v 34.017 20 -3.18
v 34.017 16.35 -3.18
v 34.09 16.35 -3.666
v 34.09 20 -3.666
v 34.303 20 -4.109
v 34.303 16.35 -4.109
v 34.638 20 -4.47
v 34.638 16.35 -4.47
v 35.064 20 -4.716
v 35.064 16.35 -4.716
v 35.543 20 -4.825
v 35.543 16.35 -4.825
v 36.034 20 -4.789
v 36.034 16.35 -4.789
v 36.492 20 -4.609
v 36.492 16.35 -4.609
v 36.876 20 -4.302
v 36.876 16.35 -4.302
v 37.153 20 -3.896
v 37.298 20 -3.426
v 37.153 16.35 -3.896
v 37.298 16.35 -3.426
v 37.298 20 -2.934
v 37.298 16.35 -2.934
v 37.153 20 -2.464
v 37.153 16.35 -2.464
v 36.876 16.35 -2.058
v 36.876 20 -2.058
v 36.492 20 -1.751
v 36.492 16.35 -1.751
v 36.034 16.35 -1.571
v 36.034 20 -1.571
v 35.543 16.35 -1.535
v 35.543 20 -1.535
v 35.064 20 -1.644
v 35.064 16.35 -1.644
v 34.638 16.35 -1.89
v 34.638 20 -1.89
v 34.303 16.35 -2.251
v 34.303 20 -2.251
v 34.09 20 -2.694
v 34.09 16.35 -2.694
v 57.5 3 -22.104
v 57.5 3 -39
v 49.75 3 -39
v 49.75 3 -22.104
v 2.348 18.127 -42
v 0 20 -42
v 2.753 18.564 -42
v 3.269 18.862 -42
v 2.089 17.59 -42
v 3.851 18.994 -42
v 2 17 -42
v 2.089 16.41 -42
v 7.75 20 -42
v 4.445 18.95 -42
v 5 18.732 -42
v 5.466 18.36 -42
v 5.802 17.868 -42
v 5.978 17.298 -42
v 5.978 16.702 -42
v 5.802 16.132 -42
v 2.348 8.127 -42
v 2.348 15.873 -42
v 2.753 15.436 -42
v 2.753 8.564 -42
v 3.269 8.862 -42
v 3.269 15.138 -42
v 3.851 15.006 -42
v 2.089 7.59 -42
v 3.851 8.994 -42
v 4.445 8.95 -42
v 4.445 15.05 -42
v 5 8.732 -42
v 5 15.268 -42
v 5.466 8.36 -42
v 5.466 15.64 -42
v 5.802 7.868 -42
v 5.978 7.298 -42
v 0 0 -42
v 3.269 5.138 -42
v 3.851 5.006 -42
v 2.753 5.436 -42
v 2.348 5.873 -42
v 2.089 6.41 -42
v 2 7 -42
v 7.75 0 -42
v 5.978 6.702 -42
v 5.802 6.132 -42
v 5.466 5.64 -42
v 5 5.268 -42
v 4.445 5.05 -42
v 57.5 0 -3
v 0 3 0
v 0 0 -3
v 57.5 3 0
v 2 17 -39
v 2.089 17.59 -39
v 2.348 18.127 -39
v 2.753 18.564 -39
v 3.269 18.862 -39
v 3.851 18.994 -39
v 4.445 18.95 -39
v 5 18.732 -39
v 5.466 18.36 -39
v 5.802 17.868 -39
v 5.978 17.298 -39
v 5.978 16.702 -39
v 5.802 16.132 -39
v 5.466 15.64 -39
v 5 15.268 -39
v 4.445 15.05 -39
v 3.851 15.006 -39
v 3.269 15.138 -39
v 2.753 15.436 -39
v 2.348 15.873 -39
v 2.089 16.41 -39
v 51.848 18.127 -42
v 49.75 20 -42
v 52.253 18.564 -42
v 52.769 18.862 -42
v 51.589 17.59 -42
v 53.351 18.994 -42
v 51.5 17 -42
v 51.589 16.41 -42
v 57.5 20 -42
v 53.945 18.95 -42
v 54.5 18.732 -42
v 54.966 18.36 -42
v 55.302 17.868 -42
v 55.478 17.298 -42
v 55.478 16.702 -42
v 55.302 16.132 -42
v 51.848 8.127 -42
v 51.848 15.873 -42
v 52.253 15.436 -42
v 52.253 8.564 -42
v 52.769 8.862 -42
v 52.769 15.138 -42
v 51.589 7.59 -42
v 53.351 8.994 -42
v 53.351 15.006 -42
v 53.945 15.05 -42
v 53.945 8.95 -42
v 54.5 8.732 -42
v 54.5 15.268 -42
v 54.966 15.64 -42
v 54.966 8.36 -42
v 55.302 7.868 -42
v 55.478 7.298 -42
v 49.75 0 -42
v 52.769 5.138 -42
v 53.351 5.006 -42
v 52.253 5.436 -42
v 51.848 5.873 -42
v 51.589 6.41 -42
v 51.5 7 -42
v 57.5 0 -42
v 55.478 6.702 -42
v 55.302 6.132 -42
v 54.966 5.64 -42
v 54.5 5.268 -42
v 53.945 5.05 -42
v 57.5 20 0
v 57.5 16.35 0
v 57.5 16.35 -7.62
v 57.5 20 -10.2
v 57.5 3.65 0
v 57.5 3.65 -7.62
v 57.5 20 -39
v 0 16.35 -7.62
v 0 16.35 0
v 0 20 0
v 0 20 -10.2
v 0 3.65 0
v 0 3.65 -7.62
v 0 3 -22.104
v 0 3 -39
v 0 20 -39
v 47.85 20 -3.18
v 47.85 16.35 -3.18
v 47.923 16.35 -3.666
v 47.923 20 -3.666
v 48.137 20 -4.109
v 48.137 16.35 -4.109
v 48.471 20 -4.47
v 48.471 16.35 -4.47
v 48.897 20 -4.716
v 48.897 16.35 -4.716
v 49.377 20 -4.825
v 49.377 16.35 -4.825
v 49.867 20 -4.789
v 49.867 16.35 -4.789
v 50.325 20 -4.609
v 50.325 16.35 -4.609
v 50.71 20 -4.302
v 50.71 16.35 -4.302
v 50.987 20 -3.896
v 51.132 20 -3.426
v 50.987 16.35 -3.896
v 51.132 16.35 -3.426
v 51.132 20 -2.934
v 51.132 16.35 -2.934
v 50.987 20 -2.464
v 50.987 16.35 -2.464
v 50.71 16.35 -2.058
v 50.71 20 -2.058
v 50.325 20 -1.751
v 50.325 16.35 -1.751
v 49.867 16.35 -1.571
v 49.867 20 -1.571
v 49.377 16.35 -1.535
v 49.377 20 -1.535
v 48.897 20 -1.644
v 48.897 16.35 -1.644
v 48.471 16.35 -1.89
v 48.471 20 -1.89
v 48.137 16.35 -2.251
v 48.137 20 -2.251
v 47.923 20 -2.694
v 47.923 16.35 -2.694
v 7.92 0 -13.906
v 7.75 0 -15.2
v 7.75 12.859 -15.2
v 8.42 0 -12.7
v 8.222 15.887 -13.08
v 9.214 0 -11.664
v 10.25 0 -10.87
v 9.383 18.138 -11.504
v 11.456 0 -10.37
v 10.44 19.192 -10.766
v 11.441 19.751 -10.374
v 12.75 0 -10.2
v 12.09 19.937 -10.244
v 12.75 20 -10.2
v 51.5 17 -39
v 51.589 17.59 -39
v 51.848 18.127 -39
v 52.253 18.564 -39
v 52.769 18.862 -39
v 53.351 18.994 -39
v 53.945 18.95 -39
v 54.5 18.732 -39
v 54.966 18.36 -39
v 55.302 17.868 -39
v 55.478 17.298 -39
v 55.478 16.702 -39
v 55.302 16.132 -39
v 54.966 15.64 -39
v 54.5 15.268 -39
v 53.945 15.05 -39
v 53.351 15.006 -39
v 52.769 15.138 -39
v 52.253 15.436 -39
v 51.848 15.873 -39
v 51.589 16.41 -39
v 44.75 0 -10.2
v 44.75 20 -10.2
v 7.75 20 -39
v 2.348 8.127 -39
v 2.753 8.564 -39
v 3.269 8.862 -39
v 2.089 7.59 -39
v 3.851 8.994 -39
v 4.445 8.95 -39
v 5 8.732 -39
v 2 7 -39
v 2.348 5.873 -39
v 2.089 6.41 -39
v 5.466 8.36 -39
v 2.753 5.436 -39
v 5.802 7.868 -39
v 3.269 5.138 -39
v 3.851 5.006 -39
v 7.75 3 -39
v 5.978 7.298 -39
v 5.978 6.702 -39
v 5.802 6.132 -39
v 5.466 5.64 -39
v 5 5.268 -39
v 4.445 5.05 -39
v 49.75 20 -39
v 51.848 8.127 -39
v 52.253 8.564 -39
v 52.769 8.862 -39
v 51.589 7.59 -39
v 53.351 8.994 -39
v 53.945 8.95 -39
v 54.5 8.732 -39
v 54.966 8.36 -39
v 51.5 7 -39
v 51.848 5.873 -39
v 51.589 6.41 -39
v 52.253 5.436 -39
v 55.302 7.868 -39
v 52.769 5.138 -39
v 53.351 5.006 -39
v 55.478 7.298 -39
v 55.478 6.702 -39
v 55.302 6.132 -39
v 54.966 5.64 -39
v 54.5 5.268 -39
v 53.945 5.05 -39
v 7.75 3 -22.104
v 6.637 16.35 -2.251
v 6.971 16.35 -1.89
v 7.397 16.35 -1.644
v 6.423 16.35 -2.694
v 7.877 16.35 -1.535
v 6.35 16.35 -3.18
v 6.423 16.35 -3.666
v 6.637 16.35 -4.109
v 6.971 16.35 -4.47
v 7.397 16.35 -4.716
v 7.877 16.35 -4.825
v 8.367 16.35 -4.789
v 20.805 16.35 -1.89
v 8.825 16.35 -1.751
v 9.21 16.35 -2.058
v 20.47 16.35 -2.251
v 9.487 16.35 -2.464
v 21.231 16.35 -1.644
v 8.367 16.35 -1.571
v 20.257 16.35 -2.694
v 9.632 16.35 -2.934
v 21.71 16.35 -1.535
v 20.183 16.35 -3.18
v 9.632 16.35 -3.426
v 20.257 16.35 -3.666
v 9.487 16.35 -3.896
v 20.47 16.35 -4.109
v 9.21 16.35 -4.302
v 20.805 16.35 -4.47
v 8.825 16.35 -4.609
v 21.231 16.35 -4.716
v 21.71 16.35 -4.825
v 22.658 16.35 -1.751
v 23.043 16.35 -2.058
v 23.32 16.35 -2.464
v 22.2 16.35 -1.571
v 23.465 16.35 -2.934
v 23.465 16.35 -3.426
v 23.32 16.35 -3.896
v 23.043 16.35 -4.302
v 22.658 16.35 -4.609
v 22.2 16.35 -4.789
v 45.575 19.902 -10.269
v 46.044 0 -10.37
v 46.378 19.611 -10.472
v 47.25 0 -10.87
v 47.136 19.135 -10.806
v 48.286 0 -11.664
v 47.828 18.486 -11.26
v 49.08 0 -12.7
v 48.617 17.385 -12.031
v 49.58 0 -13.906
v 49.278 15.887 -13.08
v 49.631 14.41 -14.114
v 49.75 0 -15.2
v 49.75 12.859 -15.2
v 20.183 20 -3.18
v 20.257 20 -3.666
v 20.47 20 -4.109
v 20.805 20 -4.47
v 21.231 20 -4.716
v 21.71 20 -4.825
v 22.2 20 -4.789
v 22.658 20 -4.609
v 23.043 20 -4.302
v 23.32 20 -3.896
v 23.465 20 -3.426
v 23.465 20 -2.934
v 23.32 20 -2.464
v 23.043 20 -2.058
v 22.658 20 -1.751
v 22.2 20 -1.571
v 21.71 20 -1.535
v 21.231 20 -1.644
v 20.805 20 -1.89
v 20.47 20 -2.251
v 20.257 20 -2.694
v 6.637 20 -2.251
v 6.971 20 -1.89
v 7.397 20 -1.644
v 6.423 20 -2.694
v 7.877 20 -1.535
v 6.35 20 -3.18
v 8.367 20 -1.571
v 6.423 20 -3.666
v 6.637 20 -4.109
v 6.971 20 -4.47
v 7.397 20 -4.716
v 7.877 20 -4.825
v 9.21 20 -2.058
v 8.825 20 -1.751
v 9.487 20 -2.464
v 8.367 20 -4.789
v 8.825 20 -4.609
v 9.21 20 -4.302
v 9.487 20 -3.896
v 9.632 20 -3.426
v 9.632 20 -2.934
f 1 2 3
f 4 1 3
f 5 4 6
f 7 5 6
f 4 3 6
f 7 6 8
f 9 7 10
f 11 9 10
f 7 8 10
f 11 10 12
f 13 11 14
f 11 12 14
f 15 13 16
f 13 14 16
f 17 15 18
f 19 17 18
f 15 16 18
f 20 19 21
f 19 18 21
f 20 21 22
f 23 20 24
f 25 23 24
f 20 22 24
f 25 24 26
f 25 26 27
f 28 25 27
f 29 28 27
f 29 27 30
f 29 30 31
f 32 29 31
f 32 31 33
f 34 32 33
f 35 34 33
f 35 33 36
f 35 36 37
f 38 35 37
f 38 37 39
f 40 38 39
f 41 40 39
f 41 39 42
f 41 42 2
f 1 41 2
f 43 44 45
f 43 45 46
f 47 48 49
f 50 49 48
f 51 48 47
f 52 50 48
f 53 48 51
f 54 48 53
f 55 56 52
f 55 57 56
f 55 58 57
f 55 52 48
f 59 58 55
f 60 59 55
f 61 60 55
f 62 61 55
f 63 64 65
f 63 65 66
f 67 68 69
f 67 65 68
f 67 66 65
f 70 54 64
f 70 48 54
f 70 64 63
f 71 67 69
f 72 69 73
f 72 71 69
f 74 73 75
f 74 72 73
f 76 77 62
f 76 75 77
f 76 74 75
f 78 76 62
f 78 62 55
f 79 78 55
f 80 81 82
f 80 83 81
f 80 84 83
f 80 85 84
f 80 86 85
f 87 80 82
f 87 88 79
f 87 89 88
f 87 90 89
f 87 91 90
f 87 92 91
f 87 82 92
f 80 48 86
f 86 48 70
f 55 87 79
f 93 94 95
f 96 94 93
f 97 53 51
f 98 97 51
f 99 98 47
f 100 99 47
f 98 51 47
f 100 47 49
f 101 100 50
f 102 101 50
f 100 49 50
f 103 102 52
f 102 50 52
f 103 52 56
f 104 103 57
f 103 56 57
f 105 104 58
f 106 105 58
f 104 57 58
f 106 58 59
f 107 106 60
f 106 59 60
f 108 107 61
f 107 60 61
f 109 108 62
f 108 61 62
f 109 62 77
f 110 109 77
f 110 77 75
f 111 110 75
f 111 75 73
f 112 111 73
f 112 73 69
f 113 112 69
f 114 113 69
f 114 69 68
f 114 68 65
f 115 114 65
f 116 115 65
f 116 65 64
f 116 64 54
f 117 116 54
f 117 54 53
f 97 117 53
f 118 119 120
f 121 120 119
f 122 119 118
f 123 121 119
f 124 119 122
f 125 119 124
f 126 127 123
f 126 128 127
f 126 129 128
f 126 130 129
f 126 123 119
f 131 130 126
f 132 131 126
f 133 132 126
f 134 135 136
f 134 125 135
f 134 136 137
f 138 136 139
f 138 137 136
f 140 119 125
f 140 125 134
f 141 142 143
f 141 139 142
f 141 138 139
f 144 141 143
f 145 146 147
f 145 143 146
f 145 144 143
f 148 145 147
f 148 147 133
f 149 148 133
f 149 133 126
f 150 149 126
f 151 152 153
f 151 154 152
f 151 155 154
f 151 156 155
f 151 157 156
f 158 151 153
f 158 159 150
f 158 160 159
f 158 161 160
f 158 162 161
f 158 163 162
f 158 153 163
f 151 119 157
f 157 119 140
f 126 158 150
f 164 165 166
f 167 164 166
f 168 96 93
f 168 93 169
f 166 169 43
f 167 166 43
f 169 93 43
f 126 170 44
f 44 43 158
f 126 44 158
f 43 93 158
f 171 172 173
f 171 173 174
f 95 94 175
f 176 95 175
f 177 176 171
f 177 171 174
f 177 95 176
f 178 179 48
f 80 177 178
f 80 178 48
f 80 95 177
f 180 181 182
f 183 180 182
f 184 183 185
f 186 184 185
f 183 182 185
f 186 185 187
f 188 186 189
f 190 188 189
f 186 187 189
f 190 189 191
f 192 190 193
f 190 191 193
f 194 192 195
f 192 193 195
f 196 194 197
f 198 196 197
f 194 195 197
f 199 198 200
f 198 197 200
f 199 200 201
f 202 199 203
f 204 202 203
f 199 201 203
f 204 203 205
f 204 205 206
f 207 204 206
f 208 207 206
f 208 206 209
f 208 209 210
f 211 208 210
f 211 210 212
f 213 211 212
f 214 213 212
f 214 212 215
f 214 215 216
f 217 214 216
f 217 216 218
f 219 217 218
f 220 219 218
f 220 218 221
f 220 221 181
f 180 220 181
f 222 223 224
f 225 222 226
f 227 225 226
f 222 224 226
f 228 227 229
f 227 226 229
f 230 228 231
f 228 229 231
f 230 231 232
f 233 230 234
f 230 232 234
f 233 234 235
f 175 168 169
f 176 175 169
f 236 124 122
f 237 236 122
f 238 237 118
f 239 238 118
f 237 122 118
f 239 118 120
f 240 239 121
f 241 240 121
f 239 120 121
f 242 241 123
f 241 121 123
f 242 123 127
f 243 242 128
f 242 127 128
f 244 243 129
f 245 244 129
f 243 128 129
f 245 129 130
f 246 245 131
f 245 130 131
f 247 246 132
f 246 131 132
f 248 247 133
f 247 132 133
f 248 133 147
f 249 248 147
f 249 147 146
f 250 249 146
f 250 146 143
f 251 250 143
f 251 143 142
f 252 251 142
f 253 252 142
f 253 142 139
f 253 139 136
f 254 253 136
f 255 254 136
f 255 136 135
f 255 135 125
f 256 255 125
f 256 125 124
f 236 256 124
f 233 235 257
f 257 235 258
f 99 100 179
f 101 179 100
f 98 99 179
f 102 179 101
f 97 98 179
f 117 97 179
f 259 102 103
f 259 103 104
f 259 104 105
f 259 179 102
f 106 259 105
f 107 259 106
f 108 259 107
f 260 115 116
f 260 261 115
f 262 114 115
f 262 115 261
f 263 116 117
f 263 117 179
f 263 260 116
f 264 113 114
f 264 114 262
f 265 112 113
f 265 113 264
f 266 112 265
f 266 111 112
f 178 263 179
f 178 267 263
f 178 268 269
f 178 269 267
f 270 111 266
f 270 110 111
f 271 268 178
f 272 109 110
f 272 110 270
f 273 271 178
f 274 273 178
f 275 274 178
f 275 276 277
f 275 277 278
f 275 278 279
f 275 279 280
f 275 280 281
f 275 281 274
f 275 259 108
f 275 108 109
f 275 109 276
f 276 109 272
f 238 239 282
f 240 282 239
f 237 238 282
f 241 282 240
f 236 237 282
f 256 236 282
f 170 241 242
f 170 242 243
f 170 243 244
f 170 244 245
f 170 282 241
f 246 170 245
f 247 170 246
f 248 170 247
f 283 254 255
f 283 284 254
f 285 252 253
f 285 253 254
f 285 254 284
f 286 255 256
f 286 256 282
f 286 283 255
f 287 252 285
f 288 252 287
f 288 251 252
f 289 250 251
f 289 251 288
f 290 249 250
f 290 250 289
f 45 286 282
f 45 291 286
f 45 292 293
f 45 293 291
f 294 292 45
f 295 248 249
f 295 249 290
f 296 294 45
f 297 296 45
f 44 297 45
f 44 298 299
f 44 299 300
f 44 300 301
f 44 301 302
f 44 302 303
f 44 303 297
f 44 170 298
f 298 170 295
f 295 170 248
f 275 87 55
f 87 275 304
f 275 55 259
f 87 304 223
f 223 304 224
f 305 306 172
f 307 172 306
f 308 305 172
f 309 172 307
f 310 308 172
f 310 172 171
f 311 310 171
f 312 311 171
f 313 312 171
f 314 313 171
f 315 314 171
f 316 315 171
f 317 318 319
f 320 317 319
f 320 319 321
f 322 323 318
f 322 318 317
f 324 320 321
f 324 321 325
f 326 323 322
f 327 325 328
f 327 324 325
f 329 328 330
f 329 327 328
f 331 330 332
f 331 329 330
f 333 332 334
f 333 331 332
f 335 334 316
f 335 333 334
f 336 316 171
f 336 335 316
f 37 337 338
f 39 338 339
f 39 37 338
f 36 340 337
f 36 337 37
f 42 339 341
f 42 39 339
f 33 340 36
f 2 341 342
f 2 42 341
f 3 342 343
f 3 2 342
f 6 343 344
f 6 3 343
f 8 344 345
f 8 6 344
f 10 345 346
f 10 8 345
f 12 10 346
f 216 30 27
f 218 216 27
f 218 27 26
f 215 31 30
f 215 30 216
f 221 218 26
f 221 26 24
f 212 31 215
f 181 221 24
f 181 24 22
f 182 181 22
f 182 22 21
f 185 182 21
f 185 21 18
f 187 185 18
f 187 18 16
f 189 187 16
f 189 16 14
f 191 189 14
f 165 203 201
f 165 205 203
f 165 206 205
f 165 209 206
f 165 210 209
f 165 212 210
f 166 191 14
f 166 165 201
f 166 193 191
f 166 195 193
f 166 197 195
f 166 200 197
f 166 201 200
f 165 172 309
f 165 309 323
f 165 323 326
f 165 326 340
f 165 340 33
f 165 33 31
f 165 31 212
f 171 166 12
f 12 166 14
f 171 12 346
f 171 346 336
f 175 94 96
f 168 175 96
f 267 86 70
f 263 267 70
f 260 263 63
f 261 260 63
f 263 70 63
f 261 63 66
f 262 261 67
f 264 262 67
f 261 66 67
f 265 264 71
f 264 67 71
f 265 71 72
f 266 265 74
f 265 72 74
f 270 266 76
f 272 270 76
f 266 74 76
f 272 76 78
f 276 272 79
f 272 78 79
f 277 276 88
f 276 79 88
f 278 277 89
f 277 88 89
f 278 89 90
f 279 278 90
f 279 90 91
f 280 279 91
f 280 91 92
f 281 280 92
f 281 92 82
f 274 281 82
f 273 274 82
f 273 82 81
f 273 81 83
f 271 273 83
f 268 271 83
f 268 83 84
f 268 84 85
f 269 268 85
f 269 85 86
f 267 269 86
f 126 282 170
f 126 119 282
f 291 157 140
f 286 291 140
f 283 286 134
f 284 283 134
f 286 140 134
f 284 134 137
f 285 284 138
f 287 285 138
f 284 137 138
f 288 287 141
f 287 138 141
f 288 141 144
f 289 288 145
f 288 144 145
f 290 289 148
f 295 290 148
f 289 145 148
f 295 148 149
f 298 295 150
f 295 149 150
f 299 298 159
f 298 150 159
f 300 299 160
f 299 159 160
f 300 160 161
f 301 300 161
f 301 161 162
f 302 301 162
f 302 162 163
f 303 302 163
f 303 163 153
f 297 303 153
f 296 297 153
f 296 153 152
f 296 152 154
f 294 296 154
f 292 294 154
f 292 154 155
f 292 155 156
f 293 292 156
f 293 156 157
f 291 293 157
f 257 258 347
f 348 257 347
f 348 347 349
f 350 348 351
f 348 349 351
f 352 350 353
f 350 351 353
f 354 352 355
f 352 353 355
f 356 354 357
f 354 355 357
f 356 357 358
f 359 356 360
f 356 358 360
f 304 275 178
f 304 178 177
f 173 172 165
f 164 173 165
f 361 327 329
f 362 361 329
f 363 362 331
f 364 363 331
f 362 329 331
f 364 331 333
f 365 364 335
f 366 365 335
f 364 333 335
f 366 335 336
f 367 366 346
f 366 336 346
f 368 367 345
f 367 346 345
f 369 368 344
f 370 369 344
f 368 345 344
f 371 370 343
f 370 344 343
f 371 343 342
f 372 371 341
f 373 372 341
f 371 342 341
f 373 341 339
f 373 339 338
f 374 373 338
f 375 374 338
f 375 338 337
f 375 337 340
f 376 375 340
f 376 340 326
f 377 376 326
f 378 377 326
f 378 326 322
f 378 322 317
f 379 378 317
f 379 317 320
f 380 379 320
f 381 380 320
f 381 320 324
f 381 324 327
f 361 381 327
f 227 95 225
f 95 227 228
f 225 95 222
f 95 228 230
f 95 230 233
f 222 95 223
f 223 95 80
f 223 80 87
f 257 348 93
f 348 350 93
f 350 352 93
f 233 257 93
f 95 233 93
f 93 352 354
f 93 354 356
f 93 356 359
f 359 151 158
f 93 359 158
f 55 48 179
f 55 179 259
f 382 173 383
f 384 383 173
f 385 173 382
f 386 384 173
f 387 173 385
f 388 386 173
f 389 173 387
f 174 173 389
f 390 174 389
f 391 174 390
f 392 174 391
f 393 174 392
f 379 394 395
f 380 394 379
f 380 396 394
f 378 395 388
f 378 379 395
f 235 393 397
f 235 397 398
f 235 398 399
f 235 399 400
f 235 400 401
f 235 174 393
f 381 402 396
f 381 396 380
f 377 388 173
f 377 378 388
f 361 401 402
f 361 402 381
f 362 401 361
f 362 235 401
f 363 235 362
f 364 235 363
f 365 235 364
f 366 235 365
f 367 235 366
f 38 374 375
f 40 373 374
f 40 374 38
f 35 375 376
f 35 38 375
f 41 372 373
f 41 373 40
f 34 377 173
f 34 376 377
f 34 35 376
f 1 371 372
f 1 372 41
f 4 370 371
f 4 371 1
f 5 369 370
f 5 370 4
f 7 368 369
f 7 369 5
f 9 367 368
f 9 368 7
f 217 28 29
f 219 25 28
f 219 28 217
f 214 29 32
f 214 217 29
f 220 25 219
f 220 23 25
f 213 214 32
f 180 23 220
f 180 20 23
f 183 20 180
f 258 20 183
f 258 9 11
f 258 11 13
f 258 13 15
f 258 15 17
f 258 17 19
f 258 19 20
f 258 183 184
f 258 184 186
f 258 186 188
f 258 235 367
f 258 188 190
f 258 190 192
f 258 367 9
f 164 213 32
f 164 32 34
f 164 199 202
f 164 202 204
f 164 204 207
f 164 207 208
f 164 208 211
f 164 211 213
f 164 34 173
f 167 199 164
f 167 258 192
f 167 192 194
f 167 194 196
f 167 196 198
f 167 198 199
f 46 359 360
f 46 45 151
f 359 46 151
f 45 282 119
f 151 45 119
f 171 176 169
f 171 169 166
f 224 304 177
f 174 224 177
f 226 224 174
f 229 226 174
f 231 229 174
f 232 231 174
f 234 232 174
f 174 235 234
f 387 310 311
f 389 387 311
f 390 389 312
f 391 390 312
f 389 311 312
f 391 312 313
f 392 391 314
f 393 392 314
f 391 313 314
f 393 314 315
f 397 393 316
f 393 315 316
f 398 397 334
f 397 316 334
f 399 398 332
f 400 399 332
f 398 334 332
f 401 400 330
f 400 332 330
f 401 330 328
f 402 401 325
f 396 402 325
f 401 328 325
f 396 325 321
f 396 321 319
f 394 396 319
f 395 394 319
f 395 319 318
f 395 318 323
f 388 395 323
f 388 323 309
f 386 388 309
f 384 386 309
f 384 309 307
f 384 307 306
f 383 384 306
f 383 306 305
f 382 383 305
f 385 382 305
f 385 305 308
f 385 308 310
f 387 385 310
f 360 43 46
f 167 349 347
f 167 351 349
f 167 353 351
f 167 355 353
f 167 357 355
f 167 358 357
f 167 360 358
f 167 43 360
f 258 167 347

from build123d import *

# Parameters (mm, degrees)
SKETCH1_W                 = 57.5
SKETCH1_H                 = 42
BOSS_EXTRUDE1_DEPTH       = 20
CUT_EXTRUDE1_DEPTH        = 21
CUT_EXTRUDE2_DEPTH        = 58.5
CUT_EXTRUDE3_REACH        = 44
SKETCH4_R                 = 2
SKETCH5_W                 = 7.62
SKETCH5_H                 = 12.7
CUT_EXTRUDE4_DEPTH        = 58.5
M4X0_7_TAPPED_HOLE1_D     = 3.3
M4X0_7_TAPPED_HOLE1_DEPTH = 3.65
CHAMFER1_SIZE             = 3


with BuildPart() as part:
    # Sketch1 → Boss-Extrude1 (new body)
    with BuildSketch(Plane(origin=(0, 0, 0), x_dir=(1, 0, 0), z_dir=(0, 1, 0))):
        with Locations((28.75, 21)):
            Rectangle(SKETCH1_W, SKETCH1_H)
    extrude(amount=BOSS_EXTRUDE1_DEPTH)

    # Sketch2 → Cut-Extrude1 (cut, through all)
    with BuildSketch(Plane(origin=(0, 20, 0), x_dir=(1, 0, 0), z_dir=(0, 1, 0))):
        with BuildLine():
            Line((7.75, 42), (7.75, 15.2))
            ThreePointArc((7.75, 15.2), (9.214466094, 11.664466094), (12.75, 10.2))
            Line((12.75, 10.2), (44.75, 10.2))
            ThreePointArc((44.75, 10.2), (48.285533906, 11.664466094), (49.75, 15.2))
            Line((49.75, 15.2), (49.75, 42))
            Line((49.75, 42), (7.75, 42))
        make_face()
    extrude(amount=-CUT_EXTRUDE1_DEPTH, mode=Mode.SUBTRACT)

    # Sketch3 → Cut-Extrude2 (cut, through all)
    with BuildSketch(Plane(origin=(57.5, 0, 0), x_dir=(0, 0, -1), z_dir=(1, 0, 0))):
        Polygon((39, 20), (39, 3), (22.10352815, 3), (10.2, 20), align=None)
    extrude(amount=-CUT_EXTRUDE2_DEPTH, mode=Mode.SUBTRACT)

    # Sketch4 → Cut-Extrude3 (cut, up to next)
    with BuildSketch(Plane(origin=(0, 0, -42), x_dir=(-1, 0, 0), z_dir=(0, 0, -1)), mode=Mode.PRIVATE) as cut_extrude3_sk1:
        with Locations((-53.5, 17)):
            Circle(SKETCH4_R)
    cut_extrude3_tool1 = extrude(cut_extrude3_sk1.sketch, amount=-CUT_EXTRUDE3_REACH, mode=Mode.PRIVATE) & part.part
    add(cut_extrude3_tool1.solids().sort_by_distance((53.5, 17, -42))[0], mode=Mode.SUBTRACT)
    # Sketch4 → Cut-Extrude3 (cut, up to next)
    with BuildSketch(Plane(origin=(0, 0, -42), x_dir=(-1, 0, 0), z_dir=(0, 0, -1)), mode=Mode.PRIVATE) as cut_extrude3_sk2:
        with Locations((-4, 17)):
            Circle(SKETCH4_R)
    cut_extrude3_tool2 = extrude(cut_extrude3_sk2.sketch, amount=-CUT_EXTRUDE3_REACH, mode=Mode.PRIVATE) & part.part
    add(cut_extrude3_tool2.solids().sort_by_distance((4, 17, -42))[0], mode=Mode.SUBTRACT)
    # Sketch4 → Cut-Extrude3 (cut, up to next)
    with BuildSketch(Plane(origin=(0, 0, -42), x_dir=(-1, 0, 0), z_dir=(0, 0, -1)), mode=Mode.PRIVATE) as cut_extrude3_sk3:
        with Locations((-4, 7)):
            Circle(SKETCH4_R)
    cut_extrude3_tool3 = extrude(cut_extrude3_sk3.sketch, amount=-CUT_EXTRUDE3_REACH, mode=Mode.PRIVATE) & part.part
    add(cut_extrude3_tool3.solids().sort_by_distance((4, 7, -42))[0], mode=Mode.SUBTRACT)
    # Sketch4 → Cut-Extrude3 (cut, up to next)
    with BuildSketch(Plane(origin=(0, 0, -42), x_dir=(-1, 0, 0), z_dir=(0, 0, -1)), mode=Mode.PRIVATE) as cut_extrude3_sk4:
        with Locations((-53.5, 7)):
            Circle(SKETCH4_R)
    cut_extrude3_tool4 = extrude(cut_extrude3_sk4.sketch, amount=-CUT_EXTRUDE3_REACH, mode=Mode.PRIVATE) & part.part
    add(cut_extrude3_tool4.solids().sort_by_distance((53.5, 7, -42))[0], mode=Mode.SUBTRACT)

    # Sketch5 → Cut-Extrude4 (cut, through all)
    with BuildSketch(Plane(origin=(57.5, 0, 0), x_dir=(0, 0, -1), z_dir=(1, 0, 0))):
        with Locations((3.81, 10)):
            Rectangle(SKETCH5_W, SKETCH5_H)
    extrude(amount=-CUT_EXTRUDE4_DEPTH, mode=Mode.SUBTRACT)

    # M4x0.7 Tapped Hole1
    with Locations(Plane(origin=(0, 20, 0), x_dir=(1, 0, 0), z_dir=(0, 1, 0))):
        with Locations((8, 3.18), (21.833333333, 3.18), (35.666666667, 3.18), (49.5, 3.18)):
            Hole(M4X0_7_TAPPED_HOLE1_D / 2, depth=M4X0_7_TAPPED_HOLE1_DEPTH)

    # Chamfer1
    chamfer1_edges = [part.edges().sort_by_distance(p)[0] for p in [
        (28.75, 0, 0),
    ]]
    chamfer(chamfer1_edges, length=CHAMFER1_SIZE)


solid = part.part
